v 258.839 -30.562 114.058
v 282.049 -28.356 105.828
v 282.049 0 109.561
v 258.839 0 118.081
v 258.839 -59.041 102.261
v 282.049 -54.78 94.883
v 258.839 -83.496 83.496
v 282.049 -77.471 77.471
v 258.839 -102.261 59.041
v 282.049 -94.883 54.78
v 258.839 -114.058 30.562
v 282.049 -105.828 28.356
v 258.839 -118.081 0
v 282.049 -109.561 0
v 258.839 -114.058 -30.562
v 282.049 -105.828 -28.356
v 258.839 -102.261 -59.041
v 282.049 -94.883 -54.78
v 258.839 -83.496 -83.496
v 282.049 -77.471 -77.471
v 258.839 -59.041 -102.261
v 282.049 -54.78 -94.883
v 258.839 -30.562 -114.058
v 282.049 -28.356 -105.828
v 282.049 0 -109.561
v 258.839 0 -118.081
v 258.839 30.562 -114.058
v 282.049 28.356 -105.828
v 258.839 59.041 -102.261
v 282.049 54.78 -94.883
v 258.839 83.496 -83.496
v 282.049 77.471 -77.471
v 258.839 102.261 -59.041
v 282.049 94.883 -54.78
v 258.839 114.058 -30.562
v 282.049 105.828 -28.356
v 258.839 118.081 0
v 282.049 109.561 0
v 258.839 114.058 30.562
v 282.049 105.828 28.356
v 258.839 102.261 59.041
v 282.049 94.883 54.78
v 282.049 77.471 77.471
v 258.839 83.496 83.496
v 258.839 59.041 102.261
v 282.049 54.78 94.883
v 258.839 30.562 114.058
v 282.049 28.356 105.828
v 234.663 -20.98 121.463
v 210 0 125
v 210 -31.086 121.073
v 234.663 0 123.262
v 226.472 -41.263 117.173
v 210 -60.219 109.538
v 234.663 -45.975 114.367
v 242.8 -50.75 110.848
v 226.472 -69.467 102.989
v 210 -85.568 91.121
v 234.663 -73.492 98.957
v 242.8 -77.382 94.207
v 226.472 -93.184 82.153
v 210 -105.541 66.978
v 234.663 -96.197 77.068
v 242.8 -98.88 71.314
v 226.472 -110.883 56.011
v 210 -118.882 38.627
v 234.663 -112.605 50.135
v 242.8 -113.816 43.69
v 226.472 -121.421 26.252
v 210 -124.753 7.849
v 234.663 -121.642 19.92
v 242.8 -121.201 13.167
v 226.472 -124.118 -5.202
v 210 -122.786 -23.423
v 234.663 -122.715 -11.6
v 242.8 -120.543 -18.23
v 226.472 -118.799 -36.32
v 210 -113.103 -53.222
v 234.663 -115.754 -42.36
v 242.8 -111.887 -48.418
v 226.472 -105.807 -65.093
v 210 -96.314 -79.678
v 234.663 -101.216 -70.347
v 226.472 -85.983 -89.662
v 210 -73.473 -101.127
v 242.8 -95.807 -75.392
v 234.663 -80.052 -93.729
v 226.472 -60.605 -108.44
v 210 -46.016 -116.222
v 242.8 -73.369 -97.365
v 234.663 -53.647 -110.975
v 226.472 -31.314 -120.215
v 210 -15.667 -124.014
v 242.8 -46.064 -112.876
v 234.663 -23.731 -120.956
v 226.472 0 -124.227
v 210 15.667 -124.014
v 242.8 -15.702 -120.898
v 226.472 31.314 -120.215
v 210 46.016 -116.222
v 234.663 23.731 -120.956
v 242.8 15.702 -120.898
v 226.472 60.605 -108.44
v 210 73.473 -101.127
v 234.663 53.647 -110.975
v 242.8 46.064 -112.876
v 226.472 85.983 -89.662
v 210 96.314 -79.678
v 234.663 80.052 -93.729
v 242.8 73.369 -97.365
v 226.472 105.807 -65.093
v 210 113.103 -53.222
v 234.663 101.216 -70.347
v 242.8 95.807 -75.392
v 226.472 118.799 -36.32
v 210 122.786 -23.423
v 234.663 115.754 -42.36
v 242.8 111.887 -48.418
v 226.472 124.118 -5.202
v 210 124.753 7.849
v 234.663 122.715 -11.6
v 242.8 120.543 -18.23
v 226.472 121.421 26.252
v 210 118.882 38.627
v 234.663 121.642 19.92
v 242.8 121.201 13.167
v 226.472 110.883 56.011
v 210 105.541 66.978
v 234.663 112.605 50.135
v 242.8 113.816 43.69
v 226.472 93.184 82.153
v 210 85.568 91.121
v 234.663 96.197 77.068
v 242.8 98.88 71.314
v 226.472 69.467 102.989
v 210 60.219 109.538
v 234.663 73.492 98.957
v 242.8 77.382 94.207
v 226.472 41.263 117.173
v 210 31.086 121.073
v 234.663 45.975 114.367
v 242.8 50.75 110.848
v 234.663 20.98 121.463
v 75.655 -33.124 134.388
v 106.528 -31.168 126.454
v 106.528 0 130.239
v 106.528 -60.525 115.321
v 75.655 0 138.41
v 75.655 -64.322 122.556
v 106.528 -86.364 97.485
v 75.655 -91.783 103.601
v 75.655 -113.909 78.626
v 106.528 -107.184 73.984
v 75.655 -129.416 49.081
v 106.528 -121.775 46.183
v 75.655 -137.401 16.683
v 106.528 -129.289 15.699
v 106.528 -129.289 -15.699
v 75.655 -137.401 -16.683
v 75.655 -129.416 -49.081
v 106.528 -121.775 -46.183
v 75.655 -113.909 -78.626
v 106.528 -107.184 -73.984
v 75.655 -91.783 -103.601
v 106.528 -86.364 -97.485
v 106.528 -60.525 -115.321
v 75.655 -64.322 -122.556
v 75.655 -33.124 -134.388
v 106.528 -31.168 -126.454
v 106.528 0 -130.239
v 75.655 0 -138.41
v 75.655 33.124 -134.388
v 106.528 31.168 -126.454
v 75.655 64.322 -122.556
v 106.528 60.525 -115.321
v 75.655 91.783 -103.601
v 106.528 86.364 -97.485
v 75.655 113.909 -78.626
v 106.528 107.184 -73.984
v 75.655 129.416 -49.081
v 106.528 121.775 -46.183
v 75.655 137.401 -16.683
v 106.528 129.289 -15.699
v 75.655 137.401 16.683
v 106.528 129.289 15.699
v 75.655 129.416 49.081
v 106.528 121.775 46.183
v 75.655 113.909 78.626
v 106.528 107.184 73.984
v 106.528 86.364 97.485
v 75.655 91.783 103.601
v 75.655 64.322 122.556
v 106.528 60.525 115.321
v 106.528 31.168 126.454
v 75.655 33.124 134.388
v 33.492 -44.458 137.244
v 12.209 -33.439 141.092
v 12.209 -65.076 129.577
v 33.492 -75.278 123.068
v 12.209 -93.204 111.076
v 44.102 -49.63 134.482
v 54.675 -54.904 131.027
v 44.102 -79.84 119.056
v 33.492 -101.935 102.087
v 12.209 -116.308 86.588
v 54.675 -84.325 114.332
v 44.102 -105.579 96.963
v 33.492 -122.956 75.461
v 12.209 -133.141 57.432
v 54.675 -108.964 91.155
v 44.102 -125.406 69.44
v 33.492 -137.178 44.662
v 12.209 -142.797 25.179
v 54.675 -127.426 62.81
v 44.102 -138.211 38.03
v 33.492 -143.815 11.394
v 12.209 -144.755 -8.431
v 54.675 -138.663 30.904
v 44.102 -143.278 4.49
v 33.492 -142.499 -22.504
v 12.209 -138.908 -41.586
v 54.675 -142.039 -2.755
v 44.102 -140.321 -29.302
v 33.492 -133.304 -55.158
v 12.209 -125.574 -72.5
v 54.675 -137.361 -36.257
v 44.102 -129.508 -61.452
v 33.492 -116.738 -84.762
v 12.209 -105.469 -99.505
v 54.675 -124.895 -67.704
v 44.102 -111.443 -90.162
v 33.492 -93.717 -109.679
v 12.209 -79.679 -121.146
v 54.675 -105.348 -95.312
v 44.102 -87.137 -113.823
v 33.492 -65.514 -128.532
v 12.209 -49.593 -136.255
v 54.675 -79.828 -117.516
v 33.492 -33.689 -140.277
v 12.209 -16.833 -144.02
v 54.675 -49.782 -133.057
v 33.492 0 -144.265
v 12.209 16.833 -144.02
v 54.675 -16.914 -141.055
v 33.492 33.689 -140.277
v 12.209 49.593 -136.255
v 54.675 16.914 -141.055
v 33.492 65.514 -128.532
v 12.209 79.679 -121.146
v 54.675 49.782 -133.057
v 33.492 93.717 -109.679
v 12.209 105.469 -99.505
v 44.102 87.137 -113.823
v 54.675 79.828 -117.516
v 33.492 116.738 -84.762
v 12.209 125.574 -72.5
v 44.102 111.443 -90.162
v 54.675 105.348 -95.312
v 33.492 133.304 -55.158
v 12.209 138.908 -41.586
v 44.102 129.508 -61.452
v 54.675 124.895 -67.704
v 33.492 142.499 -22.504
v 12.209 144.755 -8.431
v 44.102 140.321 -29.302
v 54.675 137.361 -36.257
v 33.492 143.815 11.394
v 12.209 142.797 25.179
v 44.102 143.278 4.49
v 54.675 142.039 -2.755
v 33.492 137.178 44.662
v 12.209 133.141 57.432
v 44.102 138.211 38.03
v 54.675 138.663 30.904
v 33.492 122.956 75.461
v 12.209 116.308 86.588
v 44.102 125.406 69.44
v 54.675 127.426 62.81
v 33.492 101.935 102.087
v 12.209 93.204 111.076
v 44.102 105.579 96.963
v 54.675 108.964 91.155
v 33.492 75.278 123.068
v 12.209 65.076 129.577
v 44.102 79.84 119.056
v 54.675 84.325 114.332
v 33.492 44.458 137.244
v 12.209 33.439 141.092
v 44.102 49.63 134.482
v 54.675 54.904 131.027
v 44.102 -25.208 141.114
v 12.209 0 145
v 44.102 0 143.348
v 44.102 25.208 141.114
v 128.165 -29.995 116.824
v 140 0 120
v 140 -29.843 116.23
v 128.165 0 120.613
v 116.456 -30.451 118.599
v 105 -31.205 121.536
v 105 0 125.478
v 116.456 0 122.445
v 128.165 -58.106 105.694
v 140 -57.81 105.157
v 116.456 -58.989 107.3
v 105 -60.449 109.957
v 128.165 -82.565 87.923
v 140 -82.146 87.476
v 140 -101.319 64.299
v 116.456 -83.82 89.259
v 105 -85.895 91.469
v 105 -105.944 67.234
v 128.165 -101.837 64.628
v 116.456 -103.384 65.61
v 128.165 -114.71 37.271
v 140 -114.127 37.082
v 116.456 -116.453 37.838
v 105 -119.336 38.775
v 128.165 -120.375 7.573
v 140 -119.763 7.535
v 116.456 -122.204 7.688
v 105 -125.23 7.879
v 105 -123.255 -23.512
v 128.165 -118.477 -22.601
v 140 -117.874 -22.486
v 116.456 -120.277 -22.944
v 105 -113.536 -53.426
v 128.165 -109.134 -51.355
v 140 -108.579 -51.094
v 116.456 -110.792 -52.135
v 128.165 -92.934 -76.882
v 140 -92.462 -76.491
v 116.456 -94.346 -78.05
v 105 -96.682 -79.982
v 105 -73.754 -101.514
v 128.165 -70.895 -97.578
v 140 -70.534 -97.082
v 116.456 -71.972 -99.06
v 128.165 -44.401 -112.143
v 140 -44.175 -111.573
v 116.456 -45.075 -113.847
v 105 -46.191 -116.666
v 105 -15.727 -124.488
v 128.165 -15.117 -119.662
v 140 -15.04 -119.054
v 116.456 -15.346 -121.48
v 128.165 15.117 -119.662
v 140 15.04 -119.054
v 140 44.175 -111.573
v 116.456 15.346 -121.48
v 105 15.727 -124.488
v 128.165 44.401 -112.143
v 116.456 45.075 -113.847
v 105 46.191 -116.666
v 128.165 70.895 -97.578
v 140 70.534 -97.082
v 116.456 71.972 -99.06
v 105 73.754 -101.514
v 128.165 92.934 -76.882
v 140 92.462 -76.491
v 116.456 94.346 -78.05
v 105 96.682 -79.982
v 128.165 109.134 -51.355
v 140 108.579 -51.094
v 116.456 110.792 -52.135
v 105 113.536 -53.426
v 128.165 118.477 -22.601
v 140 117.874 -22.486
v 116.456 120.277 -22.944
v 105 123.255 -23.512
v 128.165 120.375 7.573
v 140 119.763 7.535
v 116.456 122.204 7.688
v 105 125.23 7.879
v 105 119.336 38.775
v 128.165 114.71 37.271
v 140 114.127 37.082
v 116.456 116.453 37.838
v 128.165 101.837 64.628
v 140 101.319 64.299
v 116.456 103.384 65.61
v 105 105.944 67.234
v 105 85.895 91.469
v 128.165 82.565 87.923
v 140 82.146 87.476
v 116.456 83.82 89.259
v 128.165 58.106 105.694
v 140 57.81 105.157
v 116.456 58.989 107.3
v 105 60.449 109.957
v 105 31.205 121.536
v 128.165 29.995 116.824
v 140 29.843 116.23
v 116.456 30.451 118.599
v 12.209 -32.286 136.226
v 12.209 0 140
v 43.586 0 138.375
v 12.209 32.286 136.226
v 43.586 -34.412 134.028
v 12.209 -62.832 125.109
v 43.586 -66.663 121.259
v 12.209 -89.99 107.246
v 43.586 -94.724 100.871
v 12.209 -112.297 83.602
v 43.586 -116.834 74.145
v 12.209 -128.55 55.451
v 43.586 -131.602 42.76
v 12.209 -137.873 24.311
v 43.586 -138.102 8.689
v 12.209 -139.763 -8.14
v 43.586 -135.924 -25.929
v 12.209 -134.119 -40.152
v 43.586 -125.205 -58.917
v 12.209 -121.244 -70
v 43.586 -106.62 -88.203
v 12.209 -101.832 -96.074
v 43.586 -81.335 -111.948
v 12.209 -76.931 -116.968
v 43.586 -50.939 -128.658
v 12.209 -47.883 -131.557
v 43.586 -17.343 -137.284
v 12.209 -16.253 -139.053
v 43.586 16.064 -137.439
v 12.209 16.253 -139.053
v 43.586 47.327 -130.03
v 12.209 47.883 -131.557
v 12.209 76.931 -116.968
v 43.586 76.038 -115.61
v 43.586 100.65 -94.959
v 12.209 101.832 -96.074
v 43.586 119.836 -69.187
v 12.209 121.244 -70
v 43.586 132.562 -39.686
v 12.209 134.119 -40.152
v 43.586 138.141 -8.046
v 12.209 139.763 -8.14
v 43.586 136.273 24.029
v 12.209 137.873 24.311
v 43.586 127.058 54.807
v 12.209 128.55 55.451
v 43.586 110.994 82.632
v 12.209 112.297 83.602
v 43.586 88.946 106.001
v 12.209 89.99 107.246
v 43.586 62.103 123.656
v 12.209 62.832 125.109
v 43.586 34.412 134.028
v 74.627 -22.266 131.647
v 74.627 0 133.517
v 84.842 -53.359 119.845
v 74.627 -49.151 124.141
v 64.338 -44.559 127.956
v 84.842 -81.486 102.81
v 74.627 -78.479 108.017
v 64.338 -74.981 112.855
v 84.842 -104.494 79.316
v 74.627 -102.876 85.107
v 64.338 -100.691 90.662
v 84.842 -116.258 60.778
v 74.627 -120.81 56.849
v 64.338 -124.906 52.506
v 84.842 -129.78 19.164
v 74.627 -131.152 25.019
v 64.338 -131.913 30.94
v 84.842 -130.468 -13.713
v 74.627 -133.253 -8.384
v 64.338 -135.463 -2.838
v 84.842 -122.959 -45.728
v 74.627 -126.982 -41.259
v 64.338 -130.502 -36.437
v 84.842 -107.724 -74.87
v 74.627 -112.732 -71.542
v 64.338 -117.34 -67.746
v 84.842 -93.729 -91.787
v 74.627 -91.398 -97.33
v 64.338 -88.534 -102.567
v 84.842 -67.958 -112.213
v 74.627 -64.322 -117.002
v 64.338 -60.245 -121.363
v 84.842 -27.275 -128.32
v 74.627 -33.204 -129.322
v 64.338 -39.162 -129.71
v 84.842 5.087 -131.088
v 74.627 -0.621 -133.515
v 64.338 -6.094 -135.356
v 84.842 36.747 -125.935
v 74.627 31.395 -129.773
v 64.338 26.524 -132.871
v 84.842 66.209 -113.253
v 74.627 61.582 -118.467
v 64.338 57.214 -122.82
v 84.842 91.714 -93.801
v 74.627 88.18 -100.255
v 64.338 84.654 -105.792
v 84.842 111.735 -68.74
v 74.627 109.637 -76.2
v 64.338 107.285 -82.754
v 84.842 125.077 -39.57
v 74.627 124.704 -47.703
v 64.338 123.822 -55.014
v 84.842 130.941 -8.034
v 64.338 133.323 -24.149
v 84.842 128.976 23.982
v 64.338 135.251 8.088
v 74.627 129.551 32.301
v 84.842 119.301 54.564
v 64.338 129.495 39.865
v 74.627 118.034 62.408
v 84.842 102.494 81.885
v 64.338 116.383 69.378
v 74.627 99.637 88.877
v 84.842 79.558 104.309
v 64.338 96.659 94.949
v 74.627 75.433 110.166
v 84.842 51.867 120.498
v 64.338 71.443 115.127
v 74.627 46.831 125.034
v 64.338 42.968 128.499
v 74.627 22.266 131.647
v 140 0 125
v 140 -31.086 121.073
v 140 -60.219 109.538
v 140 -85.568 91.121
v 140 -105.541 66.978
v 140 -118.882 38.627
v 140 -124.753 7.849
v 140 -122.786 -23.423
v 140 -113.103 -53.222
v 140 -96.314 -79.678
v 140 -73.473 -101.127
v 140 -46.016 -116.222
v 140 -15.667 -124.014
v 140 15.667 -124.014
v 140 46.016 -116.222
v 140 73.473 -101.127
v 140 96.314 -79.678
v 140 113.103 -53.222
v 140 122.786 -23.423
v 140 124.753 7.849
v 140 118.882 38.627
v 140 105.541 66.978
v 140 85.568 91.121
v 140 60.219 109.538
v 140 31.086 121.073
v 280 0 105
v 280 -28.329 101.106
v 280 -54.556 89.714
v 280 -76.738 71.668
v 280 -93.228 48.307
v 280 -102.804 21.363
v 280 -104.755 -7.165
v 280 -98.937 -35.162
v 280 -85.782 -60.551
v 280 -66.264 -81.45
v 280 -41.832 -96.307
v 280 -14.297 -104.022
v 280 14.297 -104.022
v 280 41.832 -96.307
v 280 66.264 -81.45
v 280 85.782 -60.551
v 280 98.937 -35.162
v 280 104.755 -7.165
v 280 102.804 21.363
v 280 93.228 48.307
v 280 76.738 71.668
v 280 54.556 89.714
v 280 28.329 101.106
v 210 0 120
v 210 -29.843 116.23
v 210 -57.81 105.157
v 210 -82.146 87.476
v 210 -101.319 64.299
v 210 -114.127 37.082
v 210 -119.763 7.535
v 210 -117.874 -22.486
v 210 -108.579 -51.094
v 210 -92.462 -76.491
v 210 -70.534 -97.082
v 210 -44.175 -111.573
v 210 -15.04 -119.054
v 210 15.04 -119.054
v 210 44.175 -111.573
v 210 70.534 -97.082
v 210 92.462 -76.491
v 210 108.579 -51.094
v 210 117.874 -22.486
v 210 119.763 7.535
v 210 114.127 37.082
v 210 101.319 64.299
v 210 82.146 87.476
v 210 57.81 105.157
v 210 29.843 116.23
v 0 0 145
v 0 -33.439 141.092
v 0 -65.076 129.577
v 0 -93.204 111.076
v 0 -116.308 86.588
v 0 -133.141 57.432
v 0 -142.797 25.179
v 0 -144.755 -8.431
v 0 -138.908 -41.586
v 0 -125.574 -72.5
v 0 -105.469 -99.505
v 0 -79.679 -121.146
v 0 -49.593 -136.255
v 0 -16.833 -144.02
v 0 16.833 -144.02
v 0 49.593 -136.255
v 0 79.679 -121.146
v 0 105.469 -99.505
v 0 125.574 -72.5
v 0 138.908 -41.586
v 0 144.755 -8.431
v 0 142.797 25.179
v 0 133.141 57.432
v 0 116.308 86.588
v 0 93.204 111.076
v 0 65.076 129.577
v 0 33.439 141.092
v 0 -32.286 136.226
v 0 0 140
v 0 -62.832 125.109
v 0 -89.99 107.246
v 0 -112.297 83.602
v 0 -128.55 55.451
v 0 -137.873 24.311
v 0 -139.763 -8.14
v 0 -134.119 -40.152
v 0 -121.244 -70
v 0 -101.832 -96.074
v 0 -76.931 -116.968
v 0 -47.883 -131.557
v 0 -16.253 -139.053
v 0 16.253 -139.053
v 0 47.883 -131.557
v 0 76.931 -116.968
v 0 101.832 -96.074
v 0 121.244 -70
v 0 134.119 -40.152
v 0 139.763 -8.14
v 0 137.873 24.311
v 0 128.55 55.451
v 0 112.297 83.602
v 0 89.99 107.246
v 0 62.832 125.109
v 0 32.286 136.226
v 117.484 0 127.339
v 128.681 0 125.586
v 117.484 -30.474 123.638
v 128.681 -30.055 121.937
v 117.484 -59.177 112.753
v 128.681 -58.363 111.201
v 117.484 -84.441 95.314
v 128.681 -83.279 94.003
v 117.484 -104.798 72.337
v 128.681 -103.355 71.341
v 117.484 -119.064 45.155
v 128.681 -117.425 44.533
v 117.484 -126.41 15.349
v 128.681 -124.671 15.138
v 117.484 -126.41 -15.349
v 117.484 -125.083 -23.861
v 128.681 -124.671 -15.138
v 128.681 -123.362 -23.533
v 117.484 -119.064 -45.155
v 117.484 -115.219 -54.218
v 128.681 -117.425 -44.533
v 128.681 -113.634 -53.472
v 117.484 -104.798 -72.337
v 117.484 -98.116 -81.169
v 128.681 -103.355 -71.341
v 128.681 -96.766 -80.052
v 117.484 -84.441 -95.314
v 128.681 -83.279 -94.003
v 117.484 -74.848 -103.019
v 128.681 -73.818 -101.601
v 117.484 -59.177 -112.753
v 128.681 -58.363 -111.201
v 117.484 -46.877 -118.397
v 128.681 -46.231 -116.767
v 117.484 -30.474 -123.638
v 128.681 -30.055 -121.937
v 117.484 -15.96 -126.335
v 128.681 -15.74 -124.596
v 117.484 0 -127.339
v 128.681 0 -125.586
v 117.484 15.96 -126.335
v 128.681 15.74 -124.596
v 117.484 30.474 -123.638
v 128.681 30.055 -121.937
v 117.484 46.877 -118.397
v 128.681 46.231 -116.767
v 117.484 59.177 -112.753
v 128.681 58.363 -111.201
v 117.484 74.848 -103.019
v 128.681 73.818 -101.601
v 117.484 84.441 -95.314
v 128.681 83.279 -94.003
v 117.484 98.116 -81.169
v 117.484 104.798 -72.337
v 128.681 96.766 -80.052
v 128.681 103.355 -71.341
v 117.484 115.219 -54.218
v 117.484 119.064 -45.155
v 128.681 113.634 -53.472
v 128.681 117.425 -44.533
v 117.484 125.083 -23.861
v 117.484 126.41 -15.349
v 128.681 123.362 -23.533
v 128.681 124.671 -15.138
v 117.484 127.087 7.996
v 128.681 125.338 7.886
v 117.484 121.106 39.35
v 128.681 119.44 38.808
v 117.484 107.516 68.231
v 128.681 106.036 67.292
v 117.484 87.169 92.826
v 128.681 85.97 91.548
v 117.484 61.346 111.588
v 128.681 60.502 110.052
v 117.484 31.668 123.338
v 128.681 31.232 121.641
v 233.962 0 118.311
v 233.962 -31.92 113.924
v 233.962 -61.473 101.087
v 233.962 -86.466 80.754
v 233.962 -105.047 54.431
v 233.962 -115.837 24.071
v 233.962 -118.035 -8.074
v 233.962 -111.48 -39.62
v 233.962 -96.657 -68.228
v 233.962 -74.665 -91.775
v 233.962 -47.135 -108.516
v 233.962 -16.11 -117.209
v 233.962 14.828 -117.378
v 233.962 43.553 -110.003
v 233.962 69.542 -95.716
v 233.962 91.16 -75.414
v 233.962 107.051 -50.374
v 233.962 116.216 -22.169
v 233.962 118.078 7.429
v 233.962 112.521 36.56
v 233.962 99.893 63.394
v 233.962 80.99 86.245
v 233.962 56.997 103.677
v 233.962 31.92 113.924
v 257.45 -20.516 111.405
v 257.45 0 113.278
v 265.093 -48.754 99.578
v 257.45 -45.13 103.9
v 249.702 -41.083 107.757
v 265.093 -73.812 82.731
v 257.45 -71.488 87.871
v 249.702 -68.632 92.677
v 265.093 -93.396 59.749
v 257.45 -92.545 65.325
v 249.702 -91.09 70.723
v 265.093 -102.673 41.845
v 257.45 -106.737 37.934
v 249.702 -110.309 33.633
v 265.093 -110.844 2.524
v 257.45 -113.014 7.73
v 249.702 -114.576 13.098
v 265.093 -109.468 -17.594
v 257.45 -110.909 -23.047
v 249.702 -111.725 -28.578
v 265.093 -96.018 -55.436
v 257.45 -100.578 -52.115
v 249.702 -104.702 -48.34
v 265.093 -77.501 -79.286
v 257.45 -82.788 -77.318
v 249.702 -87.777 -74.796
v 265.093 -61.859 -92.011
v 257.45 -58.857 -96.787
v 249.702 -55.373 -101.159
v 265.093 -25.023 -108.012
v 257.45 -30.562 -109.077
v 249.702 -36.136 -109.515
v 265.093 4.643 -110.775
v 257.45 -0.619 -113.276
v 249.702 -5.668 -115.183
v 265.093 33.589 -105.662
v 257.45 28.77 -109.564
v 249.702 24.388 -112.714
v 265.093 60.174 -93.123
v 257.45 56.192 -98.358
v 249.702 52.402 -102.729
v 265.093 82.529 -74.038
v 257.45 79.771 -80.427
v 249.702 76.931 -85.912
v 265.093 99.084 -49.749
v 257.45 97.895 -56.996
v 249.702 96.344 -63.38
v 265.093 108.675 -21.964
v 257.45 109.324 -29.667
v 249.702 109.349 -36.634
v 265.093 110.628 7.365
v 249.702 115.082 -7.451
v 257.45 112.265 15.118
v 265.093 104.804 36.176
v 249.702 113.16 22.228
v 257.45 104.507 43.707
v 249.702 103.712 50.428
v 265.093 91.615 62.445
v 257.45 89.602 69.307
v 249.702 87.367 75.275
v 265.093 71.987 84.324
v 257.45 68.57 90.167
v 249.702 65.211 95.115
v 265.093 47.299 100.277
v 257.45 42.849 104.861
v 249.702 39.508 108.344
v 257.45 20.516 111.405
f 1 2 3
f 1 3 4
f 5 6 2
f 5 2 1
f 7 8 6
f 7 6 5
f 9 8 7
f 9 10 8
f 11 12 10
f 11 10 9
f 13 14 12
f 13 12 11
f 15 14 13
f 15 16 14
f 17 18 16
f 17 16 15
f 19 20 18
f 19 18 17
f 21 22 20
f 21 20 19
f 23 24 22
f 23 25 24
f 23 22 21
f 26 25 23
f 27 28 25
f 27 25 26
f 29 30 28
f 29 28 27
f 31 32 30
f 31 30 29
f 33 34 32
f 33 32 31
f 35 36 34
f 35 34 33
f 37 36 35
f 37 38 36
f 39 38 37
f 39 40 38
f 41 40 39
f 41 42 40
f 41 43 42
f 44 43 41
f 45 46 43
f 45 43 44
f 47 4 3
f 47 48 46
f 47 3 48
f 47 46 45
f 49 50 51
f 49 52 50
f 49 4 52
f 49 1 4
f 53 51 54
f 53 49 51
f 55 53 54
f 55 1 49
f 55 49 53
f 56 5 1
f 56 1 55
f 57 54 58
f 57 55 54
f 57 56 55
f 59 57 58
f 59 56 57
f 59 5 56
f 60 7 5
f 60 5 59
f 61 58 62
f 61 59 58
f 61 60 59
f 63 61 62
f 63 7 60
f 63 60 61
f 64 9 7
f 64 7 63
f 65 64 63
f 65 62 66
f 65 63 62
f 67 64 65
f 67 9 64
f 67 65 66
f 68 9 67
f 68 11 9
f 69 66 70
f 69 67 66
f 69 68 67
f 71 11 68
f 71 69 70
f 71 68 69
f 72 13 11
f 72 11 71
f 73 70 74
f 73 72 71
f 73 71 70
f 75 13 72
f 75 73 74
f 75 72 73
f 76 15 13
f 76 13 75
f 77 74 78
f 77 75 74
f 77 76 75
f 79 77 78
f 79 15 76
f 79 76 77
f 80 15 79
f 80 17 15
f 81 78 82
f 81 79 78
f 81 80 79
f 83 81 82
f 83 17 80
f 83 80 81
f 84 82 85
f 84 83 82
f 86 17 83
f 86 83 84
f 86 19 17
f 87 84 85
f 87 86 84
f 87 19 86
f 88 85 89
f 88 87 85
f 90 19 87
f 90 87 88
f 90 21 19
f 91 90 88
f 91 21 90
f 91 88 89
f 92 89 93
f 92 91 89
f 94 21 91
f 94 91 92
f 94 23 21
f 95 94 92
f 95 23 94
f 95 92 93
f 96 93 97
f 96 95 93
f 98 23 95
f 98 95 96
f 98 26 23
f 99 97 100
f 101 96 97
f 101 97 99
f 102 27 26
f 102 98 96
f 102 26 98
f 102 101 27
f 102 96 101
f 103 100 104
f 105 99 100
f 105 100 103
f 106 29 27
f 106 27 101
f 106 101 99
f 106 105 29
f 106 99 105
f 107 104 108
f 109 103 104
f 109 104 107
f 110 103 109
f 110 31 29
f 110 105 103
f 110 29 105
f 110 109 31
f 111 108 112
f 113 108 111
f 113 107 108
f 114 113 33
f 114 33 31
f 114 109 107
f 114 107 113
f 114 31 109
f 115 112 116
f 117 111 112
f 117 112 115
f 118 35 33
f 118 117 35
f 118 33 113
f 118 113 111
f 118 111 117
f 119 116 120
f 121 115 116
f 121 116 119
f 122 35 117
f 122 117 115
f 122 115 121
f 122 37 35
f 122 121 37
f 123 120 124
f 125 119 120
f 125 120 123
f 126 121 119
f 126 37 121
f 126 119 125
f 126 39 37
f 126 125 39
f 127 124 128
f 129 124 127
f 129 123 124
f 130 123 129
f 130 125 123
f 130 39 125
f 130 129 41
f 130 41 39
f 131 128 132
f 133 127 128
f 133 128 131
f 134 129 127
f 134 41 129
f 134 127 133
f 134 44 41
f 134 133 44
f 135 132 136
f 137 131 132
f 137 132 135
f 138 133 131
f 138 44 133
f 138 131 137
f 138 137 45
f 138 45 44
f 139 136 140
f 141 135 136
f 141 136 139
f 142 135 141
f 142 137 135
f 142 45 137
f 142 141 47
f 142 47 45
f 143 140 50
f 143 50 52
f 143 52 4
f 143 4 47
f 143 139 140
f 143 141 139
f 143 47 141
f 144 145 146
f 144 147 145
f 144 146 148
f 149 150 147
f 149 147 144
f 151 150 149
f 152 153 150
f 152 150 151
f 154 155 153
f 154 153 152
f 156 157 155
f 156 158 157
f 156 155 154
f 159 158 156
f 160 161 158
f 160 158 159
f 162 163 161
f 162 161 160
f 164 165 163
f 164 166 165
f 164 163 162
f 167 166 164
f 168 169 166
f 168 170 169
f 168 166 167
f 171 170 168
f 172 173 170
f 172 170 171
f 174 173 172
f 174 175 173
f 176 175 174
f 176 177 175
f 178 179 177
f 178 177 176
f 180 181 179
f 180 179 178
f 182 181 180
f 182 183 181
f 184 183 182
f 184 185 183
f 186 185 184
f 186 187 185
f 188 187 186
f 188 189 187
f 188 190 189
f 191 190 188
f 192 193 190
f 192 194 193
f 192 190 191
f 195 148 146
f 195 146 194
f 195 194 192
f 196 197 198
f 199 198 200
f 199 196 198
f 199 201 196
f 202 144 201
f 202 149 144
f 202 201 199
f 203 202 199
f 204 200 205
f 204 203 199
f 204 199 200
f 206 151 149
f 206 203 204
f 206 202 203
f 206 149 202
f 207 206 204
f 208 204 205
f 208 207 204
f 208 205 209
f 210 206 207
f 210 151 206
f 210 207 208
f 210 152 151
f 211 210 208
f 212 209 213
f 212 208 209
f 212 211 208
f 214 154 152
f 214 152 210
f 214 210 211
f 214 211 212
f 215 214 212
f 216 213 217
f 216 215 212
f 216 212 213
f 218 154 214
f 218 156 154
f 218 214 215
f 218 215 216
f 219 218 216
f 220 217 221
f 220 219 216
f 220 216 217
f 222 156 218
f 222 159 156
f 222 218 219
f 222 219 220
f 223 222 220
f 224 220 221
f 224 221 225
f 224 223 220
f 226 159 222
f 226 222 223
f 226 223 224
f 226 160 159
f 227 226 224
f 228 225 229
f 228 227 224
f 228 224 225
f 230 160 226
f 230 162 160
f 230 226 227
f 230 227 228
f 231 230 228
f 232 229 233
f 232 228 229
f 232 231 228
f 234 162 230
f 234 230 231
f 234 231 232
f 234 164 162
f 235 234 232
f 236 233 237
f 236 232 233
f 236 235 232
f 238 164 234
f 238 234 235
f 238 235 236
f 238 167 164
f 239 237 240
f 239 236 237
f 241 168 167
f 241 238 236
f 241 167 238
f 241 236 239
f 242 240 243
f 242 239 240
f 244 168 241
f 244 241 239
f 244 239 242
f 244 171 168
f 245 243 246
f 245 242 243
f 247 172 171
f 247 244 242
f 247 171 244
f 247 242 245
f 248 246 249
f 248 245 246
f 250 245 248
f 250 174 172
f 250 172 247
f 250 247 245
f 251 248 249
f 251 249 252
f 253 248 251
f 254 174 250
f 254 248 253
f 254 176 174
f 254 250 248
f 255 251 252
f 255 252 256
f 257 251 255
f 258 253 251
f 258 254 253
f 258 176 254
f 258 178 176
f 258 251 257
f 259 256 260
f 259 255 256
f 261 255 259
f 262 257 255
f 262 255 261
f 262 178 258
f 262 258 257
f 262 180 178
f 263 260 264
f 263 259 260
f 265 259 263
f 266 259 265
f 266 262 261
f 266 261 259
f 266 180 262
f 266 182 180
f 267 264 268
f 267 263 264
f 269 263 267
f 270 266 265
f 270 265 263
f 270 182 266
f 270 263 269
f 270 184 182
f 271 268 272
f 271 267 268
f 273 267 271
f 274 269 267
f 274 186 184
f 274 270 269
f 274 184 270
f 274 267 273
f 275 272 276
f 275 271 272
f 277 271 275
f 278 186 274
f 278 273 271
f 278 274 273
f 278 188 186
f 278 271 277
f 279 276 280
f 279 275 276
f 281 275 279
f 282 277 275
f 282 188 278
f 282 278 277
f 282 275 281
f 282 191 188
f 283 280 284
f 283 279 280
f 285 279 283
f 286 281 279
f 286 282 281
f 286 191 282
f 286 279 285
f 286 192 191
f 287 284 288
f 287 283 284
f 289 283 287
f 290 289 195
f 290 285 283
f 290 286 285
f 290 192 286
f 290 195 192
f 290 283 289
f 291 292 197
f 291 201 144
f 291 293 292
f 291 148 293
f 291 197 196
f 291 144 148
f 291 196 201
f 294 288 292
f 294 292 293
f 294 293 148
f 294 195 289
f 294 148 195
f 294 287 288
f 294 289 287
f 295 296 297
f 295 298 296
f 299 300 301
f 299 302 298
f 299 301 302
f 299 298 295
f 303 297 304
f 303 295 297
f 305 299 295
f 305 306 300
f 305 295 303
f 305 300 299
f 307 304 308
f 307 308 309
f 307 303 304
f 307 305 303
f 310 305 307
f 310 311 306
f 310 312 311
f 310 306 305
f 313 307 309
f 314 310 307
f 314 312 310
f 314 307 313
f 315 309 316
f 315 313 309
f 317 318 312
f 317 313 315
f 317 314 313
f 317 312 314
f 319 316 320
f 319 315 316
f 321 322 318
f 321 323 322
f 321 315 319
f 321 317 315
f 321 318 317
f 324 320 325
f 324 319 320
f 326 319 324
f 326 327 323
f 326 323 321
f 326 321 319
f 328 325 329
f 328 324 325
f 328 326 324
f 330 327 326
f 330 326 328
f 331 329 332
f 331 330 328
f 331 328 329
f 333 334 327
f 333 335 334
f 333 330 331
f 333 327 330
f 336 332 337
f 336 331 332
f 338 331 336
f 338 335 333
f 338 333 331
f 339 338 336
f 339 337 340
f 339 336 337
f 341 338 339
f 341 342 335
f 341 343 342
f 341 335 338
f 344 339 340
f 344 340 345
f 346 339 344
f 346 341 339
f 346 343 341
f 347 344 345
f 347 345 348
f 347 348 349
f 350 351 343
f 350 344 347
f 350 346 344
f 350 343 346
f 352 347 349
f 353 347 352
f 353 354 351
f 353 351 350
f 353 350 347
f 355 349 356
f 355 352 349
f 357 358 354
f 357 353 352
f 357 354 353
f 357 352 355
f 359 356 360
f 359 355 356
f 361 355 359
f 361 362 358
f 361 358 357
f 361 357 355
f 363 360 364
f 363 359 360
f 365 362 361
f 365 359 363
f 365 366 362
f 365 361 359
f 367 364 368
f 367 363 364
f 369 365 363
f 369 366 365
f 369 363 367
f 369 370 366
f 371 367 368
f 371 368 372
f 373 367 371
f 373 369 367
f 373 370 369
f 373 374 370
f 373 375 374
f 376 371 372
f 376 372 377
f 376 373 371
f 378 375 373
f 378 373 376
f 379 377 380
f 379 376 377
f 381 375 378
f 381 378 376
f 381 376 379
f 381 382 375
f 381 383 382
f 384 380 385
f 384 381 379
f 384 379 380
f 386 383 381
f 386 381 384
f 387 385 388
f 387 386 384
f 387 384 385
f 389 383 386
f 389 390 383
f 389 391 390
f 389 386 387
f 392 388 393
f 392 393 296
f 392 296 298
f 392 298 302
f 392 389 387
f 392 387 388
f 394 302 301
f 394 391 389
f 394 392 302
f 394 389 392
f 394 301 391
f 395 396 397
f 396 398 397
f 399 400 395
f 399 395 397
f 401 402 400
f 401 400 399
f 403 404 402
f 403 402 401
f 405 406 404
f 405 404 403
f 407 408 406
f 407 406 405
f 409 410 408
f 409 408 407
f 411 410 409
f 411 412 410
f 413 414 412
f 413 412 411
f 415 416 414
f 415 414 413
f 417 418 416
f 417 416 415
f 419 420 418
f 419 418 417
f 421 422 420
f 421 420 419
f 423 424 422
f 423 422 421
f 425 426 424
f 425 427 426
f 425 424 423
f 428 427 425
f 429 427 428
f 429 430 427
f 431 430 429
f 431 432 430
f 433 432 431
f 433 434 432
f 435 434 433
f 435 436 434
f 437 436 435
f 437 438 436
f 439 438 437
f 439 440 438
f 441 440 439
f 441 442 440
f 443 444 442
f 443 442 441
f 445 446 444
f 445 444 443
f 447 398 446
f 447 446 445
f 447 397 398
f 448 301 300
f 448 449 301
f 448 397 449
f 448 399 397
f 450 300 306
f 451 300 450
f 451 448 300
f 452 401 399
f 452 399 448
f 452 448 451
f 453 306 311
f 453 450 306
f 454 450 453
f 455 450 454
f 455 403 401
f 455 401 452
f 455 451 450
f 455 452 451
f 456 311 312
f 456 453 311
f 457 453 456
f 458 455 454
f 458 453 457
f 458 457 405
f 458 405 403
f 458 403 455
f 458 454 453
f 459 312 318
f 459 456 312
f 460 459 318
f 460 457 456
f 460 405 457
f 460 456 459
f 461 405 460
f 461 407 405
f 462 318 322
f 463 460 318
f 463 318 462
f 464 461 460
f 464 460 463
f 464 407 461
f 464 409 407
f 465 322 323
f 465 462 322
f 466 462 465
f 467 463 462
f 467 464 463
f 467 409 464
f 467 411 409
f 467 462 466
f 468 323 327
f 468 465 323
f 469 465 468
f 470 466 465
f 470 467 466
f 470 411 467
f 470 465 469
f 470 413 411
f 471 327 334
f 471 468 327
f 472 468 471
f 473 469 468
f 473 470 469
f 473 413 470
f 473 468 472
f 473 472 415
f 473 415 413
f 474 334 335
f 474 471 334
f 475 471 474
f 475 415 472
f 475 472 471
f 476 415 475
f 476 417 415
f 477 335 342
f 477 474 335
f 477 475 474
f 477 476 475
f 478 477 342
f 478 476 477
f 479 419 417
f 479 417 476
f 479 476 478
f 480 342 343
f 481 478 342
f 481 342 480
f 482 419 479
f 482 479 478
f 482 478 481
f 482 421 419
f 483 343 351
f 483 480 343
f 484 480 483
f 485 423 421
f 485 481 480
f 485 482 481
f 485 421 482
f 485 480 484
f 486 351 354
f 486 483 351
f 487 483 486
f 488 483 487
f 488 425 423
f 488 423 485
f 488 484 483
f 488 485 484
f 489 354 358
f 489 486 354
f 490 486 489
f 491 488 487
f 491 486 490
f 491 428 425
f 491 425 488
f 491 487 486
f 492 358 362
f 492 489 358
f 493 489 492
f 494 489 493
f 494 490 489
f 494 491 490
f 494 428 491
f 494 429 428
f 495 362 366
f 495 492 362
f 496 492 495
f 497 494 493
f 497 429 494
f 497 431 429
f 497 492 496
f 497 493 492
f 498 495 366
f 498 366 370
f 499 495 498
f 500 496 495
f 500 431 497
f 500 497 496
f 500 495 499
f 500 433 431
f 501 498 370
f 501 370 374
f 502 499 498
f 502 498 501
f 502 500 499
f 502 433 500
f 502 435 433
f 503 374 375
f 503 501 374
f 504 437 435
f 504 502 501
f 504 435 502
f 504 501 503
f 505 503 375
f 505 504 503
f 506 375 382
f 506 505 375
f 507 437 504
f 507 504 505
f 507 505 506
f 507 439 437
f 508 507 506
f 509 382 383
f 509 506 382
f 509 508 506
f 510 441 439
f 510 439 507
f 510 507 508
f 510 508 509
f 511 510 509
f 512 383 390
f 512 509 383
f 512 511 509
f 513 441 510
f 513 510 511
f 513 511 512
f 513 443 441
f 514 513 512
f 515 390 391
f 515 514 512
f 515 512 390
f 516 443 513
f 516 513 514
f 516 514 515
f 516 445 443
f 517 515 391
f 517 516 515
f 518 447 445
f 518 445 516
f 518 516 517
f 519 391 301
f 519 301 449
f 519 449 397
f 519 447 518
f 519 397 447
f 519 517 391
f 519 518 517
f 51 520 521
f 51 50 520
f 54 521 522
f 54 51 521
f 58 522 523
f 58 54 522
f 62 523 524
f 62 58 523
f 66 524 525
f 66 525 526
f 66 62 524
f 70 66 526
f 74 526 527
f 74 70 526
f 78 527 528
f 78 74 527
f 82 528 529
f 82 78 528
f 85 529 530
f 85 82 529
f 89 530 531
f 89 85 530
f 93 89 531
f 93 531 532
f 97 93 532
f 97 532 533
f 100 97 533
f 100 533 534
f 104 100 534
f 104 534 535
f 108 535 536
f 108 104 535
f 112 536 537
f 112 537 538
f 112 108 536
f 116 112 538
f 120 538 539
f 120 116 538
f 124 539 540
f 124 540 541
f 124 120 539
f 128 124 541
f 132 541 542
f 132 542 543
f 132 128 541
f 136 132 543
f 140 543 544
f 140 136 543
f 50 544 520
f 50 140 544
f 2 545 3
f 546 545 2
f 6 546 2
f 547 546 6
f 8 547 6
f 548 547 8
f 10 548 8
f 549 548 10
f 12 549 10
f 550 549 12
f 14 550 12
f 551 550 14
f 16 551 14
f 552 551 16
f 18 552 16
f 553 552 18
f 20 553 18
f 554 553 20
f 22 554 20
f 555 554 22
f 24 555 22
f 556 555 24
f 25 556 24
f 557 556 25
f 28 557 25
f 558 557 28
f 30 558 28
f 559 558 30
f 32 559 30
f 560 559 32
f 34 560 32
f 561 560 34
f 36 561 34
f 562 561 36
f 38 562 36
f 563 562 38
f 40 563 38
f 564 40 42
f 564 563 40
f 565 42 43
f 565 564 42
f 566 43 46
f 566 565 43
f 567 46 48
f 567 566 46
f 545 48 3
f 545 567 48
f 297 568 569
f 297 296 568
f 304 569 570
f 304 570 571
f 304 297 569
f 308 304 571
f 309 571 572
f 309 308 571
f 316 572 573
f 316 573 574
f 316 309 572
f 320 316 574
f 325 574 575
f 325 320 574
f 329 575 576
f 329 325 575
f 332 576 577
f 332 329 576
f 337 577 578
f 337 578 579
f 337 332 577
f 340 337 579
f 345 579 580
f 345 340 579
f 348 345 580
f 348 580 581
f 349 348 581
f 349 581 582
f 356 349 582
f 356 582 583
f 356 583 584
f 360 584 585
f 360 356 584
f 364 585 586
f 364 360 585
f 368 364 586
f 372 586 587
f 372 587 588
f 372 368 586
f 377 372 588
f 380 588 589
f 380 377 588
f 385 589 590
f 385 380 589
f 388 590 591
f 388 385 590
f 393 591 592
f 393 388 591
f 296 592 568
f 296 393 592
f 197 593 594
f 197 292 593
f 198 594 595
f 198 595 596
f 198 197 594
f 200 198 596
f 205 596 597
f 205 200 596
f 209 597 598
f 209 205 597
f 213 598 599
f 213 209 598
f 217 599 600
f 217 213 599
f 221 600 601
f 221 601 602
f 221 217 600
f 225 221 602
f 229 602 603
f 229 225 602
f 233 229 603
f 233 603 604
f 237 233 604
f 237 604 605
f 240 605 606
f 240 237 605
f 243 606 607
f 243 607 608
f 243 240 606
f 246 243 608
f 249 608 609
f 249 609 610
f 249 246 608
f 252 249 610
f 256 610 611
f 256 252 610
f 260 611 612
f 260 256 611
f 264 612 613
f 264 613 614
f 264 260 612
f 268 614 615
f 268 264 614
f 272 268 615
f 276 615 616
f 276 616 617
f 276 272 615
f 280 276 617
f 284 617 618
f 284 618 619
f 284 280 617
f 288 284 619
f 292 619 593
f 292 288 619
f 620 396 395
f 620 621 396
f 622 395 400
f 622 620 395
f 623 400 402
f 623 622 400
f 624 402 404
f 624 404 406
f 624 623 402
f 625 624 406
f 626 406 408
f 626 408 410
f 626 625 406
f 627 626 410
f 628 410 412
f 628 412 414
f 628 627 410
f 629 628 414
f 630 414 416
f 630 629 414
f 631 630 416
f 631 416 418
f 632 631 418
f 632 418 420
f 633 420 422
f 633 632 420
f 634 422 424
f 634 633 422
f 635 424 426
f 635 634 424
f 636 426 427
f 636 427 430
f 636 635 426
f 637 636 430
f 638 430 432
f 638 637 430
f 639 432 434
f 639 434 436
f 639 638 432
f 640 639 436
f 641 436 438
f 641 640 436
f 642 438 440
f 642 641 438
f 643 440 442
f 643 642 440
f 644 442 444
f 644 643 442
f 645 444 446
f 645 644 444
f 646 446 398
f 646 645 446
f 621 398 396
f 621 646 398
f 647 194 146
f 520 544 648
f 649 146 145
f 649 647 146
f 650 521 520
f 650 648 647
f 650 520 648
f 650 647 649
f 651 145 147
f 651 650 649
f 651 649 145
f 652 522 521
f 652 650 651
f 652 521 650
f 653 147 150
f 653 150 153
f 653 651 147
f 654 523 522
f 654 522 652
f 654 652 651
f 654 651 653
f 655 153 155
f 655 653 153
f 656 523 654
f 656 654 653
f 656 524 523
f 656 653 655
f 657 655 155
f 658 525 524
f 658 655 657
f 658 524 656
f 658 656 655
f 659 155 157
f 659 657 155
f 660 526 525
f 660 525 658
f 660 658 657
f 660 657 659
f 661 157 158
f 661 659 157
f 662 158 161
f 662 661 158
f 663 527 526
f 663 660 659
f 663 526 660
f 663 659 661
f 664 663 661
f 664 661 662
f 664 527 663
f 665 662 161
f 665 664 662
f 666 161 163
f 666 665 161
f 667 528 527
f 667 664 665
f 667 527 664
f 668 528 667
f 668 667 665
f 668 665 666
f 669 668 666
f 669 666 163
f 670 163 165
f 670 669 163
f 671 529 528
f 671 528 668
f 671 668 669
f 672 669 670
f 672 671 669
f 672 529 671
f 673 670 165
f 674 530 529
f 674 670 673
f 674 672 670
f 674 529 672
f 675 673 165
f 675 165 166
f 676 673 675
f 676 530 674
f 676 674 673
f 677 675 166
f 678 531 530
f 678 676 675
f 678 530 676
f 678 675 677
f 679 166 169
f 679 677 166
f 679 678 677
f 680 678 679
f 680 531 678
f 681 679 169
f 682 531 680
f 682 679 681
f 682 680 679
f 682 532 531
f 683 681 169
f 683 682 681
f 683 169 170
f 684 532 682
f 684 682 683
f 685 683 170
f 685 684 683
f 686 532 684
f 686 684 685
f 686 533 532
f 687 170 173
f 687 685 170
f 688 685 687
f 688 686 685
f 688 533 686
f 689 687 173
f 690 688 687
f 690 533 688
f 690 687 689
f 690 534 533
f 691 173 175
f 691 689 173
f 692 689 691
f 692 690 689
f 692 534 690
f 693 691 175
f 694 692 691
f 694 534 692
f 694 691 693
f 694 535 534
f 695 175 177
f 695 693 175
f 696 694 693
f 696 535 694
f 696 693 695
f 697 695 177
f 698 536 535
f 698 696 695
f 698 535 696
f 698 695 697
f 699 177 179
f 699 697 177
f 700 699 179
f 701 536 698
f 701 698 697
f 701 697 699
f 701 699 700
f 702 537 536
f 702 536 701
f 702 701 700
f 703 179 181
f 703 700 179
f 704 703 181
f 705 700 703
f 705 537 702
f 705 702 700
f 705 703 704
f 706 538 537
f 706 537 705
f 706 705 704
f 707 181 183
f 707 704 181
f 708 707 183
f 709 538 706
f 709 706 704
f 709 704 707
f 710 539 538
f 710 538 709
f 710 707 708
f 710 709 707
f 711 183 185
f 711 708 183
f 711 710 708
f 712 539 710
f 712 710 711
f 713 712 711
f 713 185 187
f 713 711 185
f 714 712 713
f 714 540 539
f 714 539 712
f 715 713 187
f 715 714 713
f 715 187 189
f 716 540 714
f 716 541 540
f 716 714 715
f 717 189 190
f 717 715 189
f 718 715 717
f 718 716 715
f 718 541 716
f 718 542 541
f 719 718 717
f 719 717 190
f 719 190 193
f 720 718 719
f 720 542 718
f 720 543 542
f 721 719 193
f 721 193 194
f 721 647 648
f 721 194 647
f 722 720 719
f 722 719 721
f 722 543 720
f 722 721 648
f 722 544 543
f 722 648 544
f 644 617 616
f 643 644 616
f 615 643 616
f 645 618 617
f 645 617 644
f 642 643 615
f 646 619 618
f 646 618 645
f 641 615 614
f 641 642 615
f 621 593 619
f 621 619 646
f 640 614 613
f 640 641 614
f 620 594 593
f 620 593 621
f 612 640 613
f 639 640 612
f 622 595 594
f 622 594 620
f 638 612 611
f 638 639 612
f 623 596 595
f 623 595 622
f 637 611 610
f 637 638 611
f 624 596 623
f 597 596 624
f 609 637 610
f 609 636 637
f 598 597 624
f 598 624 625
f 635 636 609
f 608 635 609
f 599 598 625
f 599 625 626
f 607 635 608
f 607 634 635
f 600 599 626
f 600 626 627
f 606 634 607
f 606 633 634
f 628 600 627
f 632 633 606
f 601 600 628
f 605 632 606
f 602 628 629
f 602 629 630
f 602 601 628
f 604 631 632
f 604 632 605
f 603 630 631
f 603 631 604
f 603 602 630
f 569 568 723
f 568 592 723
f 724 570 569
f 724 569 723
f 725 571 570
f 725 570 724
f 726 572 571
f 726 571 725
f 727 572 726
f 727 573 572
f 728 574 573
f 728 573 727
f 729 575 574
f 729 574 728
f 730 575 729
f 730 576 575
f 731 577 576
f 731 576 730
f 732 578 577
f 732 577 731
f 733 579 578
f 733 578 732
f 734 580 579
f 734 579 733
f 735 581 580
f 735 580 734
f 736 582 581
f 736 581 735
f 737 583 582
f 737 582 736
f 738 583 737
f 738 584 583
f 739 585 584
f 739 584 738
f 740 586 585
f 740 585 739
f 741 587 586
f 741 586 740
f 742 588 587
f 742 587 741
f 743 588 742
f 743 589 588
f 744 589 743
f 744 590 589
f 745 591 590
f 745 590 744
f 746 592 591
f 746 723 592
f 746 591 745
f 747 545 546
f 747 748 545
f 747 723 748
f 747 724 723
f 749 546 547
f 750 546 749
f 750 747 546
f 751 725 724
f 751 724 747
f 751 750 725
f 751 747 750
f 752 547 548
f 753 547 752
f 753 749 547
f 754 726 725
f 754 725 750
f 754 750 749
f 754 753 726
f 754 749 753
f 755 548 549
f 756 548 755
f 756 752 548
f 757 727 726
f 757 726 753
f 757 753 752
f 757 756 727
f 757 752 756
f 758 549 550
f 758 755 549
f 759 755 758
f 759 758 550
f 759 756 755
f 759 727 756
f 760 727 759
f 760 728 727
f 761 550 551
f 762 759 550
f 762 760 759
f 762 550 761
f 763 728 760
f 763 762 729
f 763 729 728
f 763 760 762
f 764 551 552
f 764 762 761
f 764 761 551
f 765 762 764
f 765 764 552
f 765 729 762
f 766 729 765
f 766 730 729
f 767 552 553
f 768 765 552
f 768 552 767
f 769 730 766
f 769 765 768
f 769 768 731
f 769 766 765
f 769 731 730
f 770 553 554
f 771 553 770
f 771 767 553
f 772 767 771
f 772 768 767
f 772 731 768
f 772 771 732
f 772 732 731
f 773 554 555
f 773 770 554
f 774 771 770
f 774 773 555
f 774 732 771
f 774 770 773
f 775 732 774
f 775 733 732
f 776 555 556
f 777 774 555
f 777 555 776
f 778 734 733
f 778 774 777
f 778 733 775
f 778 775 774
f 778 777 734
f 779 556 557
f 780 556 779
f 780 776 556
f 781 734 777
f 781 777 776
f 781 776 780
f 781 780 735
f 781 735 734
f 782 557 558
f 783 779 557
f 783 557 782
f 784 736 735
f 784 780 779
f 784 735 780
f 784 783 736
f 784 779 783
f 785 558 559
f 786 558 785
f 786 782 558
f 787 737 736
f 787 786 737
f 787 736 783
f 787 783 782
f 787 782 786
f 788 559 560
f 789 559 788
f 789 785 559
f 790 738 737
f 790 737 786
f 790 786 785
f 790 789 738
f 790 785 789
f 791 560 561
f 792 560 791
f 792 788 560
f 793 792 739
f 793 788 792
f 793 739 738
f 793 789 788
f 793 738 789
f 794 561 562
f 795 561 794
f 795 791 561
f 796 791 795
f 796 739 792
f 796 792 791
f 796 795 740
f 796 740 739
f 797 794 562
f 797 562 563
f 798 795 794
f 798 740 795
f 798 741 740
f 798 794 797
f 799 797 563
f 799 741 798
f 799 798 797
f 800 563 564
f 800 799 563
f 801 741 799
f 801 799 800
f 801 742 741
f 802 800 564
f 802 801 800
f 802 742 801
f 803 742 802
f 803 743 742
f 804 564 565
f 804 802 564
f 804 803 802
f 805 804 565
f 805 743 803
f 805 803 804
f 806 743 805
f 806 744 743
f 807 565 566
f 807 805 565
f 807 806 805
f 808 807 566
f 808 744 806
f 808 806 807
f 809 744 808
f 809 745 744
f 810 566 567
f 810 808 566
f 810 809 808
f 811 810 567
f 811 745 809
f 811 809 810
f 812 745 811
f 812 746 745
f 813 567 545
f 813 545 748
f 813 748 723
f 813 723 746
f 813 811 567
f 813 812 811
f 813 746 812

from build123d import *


with BuildPart() as part:
    # Sketch1 → Revolve1 (revolve)
    with BuildSketch(Plane.XY, mode=Mode.PRIVATE) as revolve1_sk:
        with BuildLine():
            ThreePointArc((210, 125.0000004), (246.84219817, 121.096924766), (282.048780538, 109.560975587))
            Line((282.048780538, 109.560975587), (280, 105))
            ThreePointArc((280, 105), (245.7945527, 116.207912702), (210, 120.0000004))
            Line((210, 120.0000004), (140, 120.0000004))
            ThreePointArc((140, 120.0000004), (122.286974227, 121.377708328), (105, 125.477694091))
            ThreePointArc((105, 125.477694091), (59.169265001, 136.347459879), (12.208994244, 140))
            Line((12.208994244, 140), (0, 140))
            Line((0, 140), (0, 145))
            Line((0, 145), (12.208994244, 145))
            ThreePointArc((12.208994244, 145), (59.942381599, 141.287327359), (106.527637417, 130.238610381))
            ThreePointArc((106.527637417, 130.238610381), (123.060090825, 126.317575808), (140, 125.0000004))
            Line((140, 125.0000004), (210, 125.0000004))
        make_face()
    revolve(revolve1_sk.sketch.rotate(Axis((0, 0, 0), (1, 0, 0)), 90), axis=Axis((0, 0, 0), (1, 0, 0)))


solid = part.part
